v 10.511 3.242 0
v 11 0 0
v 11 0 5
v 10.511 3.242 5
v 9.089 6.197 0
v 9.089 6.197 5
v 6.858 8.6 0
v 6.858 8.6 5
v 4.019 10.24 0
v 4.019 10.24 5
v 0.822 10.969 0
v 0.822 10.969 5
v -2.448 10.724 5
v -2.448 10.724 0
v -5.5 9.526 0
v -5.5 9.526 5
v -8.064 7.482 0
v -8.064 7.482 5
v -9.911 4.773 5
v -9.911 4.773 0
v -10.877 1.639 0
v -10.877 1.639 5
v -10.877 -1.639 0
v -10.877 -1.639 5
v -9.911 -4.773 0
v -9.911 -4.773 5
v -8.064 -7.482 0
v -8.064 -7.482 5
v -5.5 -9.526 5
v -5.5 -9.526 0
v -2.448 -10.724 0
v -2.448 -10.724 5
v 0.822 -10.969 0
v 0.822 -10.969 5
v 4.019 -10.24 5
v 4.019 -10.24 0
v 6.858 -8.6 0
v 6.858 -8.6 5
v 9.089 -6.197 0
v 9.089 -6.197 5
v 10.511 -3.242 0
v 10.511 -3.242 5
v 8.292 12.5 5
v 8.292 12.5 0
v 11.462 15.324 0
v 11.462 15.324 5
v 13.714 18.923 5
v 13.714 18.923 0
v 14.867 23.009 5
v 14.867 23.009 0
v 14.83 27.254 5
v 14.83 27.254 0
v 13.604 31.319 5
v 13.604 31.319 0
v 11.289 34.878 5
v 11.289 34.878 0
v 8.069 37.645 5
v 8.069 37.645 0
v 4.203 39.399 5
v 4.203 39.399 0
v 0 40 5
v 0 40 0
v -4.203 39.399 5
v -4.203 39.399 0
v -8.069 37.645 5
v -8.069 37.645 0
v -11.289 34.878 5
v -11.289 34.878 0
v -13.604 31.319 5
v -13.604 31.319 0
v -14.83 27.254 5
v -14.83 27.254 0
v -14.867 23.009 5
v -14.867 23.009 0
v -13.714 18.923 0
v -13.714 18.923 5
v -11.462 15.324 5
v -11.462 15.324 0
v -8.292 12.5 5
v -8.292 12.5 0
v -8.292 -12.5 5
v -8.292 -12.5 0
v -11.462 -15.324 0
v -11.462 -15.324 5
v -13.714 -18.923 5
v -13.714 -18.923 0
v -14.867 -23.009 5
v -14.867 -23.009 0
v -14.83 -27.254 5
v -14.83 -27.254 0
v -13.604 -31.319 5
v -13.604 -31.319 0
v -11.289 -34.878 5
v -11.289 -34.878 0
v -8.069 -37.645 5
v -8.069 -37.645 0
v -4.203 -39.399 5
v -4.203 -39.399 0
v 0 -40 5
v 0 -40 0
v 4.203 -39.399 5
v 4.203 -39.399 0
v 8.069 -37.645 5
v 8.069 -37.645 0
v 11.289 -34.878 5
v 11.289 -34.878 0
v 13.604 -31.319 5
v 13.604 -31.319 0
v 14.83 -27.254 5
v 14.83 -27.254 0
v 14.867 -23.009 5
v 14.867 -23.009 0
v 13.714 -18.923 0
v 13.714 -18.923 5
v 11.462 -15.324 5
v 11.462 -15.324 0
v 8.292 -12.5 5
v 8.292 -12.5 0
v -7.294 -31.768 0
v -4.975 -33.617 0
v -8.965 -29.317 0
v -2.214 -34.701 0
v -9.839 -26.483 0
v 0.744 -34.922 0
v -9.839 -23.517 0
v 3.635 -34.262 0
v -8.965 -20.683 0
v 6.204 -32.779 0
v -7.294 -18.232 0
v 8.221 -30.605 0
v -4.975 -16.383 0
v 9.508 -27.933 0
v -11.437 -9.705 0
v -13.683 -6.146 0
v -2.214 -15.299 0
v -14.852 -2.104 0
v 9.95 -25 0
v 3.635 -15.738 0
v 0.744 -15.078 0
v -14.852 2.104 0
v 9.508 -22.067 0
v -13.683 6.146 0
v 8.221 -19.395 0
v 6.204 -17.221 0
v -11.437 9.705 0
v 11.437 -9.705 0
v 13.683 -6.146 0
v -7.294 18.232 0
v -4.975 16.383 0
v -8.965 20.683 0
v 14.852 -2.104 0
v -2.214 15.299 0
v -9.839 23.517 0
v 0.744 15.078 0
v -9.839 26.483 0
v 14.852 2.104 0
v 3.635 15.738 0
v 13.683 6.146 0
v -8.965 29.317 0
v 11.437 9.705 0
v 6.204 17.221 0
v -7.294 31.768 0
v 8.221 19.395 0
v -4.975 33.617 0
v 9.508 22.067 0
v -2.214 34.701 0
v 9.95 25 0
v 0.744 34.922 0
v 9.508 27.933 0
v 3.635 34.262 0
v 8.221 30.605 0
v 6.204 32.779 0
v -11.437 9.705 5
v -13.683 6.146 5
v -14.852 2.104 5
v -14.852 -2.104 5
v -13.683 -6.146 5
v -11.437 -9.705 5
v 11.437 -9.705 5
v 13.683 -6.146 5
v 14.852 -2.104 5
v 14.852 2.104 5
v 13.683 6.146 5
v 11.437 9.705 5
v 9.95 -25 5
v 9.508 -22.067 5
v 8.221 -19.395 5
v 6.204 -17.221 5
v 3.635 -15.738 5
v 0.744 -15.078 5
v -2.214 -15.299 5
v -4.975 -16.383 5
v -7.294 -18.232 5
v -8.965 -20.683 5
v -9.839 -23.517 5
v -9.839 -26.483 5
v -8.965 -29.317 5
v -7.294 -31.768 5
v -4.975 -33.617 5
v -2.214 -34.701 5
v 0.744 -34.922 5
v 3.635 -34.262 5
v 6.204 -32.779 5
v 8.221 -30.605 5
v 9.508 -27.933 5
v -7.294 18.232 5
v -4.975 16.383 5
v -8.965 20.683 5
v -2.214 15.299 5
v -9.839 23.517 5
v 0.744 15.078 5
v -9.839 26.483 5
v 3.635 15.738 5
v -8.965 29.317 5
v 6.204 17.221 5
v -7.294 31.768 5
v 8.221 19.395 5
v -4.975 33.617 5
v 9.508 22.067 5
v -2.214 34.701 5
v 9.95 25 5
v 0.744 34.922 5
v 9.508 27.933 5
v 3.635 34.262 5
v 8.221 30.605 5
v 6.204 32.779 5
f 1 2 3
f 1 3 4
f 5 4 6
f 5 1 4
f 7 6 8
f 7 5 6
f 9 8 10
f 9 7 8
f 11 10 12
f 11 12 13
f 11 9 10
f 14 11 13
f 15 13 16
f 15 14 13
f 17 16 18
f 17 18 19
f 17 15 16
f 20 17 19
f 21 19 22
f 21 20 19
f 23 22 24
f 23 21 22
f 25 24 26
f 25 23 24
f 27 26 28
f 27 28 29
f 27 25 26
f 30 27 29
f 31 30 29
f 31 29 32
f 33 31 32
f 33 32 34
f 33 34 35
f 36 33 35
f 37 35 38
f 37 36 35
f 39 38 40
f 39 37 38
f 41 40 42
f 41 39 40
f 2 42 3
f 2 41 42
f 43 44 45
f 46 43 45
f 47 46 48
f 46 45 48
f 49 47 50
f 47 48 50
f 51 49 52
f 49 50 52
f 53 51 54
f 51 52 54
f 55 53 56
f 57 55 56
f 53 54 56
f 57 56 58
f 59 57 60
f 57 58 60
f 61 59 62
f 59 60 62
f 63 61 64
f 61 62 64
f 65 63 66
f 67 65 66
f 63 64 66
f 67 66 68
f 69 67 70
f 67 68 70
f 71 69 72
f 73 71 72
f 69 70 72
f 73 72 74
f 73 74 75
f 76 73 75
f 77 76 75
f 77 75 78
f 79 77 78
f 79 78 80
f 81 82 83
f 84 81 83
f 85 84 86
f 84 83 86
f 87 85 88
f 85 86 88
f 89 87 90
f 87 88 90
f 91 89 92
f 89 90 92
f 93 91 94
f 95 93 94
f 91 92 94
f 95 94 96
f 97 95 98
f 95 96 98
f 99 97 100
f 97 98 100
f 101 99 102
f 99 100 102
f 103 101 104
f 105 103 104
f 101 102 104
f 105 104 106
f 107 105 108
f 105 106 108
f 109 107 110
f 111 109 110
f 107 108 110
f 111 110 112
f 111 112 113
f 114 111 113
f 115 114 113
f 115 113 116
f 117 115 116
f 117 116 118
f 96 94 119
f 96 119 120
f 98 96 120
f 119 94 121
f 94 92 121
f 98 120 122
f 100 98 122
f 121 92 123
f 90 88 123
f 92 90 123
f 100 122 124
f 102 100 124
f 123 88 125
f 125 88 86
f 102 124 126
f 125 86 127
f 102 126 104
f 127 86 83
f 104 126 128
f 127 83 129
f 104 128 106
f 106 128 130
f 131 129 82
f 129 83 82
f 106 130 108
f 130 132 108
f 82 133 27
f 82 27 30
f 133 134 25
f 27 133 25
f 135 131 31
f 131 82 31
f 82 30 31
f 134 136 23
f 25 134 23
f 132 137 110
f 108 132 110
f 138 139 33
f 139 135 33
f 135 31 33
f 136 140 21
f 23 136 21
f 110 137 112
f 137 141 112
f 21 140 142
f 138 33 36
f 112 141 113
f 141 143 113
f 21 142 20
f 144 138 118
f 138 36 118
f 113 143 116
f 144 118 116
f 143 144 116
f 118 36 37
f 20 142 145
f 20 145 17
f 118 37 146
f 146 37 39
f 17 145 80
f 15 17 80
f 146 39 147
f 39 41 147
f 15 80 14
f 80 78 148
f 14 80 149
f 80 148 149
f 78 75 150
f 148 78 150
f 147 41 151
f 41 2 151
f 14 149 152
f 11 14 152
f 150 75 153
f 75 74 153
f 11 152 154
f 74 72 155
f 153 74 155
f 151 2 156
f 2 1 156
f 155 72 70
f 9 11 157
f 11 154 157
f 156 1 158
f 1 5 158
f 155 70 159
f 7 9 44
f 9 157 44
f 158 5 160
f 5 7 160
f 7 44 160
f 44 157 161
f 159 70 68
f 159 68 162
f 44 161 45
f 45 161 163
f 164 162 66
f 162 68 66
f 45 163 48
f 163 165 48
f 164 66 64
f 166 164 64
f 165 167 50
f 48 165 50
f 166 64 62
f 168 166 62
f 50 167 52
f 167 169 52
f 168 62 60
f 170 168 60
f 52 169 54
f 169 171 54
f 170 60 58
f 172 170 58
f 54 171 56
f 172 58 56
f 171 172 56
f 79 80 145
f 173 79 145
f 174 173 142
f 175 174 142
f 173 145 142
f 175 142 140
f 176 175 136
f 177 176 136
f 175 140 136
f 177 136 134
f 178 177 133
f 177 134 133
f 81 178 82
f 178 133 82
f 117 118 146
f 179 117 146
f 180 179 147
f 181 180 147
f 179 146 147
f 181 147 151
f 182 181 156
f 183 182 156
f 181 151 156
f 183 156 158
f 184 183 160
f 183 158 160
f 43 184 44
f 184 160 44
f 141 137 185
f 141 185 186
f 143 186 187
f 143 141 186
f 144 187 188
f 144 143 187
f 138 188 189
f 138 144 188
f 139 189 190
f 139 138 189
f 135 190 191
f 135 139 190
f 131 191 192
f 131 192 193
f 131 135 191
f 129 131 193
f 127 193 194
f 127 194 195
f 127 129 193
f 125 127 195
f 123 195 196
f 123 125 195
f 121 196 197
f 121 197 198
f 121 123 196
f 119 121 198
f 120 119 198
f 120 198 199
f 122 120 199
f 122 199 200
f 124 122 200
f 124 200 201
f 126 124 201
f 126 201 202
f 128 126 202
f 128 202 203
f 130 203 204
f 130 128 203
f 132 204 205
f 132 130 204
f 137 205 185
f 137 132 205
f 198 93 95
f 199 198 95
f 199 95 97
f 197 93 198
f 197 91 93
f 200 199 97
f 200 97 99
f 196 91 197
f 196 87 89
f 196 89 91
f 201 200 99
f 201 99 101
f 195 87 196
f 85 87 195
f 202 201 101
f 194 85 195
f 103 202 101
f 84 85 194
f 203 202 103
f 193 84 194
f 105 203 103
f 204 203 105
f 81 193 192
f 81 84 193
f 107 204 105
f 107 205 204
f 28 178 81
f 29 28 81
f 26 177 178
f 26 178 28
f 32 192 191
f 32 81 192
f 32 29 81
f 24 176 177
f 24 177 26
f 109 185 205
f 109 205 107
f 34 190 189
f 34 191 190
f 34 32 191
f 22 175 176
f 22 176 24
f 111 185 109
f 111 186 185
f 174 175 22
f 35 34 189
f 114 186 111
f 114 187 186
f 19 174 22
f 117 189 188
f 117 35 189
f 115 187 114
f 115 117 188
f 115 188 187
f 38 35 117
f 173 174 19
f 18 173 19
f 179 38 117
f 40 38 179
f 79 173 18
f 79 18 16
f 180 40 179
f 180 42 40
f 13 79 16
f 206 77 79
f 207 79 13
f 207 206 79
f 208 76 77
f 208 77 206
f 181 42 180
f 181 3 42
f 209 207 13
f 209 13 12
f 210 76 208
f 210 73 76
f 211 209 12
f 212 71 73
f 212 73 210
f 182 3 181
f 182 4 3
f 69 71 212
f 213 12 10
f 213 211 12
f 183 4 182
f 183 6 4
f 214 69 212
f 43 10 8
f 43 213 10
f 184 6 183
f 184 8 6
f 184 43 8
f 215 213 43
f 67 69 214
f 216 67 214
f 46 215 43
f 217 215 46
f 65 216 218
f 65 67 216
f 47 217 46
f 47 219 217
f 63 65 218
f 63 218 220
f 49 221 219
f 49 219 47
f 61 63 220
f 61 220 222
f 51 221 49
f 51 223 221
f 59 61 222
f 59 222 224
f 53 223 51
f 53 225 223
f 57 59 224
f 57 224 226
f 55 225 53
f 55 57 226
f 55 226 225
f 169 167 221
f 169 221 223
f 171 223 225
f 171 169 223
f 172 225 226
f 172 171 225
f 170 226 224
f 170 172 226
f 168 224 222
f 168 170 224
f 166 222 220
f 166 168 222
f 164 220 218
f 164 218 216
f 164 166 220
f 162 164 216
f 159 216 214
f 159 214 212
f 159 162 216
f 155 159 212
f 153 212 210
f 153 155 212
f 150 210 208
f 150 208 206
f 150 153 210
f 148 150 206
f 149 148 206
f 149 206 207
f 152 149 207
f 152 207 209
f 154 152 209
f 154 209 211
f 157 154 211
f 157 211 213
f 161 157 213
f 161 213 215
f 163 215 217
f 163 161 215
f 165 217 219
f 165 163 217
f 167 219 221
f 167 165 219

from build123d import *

# Parameters (mm, degrees)
F0_R     = 9.95
F0_R_2   = 11
F1_DEPTH = 5


with BuildPart() as f1:
    # F0 (on Top) → F1 (new body)
    with BuildSketch(Plane.XY):
        with BuildLine():
            ThreePointArc((8.291562, -12.5), (15, 0), (8.291562, 12.5))
            ThreePointArc((8.291562, 12.5), (0, 40), (-8.291562, 12.5))
            ThreePointArc((-8.291562, 12.5), (-15, 0), (-8.291562, -12.5))
            ThreePointArc((-8.291562, -12.5), (0, -40), (8.291562, -12.5))
        make_face()
        with Locations((0, -25)):
            Circle(F0_R, mode=Mode.SUBTRACT)
        Circle(F0_R_2, mode=Mode.SUBTRACT)
        with Locations((0, 25)):
            Circle(F0_R, mode=Mode.SUBTRACT)
    extrude(amount=F1_DEPTH)


solid = f1.part
